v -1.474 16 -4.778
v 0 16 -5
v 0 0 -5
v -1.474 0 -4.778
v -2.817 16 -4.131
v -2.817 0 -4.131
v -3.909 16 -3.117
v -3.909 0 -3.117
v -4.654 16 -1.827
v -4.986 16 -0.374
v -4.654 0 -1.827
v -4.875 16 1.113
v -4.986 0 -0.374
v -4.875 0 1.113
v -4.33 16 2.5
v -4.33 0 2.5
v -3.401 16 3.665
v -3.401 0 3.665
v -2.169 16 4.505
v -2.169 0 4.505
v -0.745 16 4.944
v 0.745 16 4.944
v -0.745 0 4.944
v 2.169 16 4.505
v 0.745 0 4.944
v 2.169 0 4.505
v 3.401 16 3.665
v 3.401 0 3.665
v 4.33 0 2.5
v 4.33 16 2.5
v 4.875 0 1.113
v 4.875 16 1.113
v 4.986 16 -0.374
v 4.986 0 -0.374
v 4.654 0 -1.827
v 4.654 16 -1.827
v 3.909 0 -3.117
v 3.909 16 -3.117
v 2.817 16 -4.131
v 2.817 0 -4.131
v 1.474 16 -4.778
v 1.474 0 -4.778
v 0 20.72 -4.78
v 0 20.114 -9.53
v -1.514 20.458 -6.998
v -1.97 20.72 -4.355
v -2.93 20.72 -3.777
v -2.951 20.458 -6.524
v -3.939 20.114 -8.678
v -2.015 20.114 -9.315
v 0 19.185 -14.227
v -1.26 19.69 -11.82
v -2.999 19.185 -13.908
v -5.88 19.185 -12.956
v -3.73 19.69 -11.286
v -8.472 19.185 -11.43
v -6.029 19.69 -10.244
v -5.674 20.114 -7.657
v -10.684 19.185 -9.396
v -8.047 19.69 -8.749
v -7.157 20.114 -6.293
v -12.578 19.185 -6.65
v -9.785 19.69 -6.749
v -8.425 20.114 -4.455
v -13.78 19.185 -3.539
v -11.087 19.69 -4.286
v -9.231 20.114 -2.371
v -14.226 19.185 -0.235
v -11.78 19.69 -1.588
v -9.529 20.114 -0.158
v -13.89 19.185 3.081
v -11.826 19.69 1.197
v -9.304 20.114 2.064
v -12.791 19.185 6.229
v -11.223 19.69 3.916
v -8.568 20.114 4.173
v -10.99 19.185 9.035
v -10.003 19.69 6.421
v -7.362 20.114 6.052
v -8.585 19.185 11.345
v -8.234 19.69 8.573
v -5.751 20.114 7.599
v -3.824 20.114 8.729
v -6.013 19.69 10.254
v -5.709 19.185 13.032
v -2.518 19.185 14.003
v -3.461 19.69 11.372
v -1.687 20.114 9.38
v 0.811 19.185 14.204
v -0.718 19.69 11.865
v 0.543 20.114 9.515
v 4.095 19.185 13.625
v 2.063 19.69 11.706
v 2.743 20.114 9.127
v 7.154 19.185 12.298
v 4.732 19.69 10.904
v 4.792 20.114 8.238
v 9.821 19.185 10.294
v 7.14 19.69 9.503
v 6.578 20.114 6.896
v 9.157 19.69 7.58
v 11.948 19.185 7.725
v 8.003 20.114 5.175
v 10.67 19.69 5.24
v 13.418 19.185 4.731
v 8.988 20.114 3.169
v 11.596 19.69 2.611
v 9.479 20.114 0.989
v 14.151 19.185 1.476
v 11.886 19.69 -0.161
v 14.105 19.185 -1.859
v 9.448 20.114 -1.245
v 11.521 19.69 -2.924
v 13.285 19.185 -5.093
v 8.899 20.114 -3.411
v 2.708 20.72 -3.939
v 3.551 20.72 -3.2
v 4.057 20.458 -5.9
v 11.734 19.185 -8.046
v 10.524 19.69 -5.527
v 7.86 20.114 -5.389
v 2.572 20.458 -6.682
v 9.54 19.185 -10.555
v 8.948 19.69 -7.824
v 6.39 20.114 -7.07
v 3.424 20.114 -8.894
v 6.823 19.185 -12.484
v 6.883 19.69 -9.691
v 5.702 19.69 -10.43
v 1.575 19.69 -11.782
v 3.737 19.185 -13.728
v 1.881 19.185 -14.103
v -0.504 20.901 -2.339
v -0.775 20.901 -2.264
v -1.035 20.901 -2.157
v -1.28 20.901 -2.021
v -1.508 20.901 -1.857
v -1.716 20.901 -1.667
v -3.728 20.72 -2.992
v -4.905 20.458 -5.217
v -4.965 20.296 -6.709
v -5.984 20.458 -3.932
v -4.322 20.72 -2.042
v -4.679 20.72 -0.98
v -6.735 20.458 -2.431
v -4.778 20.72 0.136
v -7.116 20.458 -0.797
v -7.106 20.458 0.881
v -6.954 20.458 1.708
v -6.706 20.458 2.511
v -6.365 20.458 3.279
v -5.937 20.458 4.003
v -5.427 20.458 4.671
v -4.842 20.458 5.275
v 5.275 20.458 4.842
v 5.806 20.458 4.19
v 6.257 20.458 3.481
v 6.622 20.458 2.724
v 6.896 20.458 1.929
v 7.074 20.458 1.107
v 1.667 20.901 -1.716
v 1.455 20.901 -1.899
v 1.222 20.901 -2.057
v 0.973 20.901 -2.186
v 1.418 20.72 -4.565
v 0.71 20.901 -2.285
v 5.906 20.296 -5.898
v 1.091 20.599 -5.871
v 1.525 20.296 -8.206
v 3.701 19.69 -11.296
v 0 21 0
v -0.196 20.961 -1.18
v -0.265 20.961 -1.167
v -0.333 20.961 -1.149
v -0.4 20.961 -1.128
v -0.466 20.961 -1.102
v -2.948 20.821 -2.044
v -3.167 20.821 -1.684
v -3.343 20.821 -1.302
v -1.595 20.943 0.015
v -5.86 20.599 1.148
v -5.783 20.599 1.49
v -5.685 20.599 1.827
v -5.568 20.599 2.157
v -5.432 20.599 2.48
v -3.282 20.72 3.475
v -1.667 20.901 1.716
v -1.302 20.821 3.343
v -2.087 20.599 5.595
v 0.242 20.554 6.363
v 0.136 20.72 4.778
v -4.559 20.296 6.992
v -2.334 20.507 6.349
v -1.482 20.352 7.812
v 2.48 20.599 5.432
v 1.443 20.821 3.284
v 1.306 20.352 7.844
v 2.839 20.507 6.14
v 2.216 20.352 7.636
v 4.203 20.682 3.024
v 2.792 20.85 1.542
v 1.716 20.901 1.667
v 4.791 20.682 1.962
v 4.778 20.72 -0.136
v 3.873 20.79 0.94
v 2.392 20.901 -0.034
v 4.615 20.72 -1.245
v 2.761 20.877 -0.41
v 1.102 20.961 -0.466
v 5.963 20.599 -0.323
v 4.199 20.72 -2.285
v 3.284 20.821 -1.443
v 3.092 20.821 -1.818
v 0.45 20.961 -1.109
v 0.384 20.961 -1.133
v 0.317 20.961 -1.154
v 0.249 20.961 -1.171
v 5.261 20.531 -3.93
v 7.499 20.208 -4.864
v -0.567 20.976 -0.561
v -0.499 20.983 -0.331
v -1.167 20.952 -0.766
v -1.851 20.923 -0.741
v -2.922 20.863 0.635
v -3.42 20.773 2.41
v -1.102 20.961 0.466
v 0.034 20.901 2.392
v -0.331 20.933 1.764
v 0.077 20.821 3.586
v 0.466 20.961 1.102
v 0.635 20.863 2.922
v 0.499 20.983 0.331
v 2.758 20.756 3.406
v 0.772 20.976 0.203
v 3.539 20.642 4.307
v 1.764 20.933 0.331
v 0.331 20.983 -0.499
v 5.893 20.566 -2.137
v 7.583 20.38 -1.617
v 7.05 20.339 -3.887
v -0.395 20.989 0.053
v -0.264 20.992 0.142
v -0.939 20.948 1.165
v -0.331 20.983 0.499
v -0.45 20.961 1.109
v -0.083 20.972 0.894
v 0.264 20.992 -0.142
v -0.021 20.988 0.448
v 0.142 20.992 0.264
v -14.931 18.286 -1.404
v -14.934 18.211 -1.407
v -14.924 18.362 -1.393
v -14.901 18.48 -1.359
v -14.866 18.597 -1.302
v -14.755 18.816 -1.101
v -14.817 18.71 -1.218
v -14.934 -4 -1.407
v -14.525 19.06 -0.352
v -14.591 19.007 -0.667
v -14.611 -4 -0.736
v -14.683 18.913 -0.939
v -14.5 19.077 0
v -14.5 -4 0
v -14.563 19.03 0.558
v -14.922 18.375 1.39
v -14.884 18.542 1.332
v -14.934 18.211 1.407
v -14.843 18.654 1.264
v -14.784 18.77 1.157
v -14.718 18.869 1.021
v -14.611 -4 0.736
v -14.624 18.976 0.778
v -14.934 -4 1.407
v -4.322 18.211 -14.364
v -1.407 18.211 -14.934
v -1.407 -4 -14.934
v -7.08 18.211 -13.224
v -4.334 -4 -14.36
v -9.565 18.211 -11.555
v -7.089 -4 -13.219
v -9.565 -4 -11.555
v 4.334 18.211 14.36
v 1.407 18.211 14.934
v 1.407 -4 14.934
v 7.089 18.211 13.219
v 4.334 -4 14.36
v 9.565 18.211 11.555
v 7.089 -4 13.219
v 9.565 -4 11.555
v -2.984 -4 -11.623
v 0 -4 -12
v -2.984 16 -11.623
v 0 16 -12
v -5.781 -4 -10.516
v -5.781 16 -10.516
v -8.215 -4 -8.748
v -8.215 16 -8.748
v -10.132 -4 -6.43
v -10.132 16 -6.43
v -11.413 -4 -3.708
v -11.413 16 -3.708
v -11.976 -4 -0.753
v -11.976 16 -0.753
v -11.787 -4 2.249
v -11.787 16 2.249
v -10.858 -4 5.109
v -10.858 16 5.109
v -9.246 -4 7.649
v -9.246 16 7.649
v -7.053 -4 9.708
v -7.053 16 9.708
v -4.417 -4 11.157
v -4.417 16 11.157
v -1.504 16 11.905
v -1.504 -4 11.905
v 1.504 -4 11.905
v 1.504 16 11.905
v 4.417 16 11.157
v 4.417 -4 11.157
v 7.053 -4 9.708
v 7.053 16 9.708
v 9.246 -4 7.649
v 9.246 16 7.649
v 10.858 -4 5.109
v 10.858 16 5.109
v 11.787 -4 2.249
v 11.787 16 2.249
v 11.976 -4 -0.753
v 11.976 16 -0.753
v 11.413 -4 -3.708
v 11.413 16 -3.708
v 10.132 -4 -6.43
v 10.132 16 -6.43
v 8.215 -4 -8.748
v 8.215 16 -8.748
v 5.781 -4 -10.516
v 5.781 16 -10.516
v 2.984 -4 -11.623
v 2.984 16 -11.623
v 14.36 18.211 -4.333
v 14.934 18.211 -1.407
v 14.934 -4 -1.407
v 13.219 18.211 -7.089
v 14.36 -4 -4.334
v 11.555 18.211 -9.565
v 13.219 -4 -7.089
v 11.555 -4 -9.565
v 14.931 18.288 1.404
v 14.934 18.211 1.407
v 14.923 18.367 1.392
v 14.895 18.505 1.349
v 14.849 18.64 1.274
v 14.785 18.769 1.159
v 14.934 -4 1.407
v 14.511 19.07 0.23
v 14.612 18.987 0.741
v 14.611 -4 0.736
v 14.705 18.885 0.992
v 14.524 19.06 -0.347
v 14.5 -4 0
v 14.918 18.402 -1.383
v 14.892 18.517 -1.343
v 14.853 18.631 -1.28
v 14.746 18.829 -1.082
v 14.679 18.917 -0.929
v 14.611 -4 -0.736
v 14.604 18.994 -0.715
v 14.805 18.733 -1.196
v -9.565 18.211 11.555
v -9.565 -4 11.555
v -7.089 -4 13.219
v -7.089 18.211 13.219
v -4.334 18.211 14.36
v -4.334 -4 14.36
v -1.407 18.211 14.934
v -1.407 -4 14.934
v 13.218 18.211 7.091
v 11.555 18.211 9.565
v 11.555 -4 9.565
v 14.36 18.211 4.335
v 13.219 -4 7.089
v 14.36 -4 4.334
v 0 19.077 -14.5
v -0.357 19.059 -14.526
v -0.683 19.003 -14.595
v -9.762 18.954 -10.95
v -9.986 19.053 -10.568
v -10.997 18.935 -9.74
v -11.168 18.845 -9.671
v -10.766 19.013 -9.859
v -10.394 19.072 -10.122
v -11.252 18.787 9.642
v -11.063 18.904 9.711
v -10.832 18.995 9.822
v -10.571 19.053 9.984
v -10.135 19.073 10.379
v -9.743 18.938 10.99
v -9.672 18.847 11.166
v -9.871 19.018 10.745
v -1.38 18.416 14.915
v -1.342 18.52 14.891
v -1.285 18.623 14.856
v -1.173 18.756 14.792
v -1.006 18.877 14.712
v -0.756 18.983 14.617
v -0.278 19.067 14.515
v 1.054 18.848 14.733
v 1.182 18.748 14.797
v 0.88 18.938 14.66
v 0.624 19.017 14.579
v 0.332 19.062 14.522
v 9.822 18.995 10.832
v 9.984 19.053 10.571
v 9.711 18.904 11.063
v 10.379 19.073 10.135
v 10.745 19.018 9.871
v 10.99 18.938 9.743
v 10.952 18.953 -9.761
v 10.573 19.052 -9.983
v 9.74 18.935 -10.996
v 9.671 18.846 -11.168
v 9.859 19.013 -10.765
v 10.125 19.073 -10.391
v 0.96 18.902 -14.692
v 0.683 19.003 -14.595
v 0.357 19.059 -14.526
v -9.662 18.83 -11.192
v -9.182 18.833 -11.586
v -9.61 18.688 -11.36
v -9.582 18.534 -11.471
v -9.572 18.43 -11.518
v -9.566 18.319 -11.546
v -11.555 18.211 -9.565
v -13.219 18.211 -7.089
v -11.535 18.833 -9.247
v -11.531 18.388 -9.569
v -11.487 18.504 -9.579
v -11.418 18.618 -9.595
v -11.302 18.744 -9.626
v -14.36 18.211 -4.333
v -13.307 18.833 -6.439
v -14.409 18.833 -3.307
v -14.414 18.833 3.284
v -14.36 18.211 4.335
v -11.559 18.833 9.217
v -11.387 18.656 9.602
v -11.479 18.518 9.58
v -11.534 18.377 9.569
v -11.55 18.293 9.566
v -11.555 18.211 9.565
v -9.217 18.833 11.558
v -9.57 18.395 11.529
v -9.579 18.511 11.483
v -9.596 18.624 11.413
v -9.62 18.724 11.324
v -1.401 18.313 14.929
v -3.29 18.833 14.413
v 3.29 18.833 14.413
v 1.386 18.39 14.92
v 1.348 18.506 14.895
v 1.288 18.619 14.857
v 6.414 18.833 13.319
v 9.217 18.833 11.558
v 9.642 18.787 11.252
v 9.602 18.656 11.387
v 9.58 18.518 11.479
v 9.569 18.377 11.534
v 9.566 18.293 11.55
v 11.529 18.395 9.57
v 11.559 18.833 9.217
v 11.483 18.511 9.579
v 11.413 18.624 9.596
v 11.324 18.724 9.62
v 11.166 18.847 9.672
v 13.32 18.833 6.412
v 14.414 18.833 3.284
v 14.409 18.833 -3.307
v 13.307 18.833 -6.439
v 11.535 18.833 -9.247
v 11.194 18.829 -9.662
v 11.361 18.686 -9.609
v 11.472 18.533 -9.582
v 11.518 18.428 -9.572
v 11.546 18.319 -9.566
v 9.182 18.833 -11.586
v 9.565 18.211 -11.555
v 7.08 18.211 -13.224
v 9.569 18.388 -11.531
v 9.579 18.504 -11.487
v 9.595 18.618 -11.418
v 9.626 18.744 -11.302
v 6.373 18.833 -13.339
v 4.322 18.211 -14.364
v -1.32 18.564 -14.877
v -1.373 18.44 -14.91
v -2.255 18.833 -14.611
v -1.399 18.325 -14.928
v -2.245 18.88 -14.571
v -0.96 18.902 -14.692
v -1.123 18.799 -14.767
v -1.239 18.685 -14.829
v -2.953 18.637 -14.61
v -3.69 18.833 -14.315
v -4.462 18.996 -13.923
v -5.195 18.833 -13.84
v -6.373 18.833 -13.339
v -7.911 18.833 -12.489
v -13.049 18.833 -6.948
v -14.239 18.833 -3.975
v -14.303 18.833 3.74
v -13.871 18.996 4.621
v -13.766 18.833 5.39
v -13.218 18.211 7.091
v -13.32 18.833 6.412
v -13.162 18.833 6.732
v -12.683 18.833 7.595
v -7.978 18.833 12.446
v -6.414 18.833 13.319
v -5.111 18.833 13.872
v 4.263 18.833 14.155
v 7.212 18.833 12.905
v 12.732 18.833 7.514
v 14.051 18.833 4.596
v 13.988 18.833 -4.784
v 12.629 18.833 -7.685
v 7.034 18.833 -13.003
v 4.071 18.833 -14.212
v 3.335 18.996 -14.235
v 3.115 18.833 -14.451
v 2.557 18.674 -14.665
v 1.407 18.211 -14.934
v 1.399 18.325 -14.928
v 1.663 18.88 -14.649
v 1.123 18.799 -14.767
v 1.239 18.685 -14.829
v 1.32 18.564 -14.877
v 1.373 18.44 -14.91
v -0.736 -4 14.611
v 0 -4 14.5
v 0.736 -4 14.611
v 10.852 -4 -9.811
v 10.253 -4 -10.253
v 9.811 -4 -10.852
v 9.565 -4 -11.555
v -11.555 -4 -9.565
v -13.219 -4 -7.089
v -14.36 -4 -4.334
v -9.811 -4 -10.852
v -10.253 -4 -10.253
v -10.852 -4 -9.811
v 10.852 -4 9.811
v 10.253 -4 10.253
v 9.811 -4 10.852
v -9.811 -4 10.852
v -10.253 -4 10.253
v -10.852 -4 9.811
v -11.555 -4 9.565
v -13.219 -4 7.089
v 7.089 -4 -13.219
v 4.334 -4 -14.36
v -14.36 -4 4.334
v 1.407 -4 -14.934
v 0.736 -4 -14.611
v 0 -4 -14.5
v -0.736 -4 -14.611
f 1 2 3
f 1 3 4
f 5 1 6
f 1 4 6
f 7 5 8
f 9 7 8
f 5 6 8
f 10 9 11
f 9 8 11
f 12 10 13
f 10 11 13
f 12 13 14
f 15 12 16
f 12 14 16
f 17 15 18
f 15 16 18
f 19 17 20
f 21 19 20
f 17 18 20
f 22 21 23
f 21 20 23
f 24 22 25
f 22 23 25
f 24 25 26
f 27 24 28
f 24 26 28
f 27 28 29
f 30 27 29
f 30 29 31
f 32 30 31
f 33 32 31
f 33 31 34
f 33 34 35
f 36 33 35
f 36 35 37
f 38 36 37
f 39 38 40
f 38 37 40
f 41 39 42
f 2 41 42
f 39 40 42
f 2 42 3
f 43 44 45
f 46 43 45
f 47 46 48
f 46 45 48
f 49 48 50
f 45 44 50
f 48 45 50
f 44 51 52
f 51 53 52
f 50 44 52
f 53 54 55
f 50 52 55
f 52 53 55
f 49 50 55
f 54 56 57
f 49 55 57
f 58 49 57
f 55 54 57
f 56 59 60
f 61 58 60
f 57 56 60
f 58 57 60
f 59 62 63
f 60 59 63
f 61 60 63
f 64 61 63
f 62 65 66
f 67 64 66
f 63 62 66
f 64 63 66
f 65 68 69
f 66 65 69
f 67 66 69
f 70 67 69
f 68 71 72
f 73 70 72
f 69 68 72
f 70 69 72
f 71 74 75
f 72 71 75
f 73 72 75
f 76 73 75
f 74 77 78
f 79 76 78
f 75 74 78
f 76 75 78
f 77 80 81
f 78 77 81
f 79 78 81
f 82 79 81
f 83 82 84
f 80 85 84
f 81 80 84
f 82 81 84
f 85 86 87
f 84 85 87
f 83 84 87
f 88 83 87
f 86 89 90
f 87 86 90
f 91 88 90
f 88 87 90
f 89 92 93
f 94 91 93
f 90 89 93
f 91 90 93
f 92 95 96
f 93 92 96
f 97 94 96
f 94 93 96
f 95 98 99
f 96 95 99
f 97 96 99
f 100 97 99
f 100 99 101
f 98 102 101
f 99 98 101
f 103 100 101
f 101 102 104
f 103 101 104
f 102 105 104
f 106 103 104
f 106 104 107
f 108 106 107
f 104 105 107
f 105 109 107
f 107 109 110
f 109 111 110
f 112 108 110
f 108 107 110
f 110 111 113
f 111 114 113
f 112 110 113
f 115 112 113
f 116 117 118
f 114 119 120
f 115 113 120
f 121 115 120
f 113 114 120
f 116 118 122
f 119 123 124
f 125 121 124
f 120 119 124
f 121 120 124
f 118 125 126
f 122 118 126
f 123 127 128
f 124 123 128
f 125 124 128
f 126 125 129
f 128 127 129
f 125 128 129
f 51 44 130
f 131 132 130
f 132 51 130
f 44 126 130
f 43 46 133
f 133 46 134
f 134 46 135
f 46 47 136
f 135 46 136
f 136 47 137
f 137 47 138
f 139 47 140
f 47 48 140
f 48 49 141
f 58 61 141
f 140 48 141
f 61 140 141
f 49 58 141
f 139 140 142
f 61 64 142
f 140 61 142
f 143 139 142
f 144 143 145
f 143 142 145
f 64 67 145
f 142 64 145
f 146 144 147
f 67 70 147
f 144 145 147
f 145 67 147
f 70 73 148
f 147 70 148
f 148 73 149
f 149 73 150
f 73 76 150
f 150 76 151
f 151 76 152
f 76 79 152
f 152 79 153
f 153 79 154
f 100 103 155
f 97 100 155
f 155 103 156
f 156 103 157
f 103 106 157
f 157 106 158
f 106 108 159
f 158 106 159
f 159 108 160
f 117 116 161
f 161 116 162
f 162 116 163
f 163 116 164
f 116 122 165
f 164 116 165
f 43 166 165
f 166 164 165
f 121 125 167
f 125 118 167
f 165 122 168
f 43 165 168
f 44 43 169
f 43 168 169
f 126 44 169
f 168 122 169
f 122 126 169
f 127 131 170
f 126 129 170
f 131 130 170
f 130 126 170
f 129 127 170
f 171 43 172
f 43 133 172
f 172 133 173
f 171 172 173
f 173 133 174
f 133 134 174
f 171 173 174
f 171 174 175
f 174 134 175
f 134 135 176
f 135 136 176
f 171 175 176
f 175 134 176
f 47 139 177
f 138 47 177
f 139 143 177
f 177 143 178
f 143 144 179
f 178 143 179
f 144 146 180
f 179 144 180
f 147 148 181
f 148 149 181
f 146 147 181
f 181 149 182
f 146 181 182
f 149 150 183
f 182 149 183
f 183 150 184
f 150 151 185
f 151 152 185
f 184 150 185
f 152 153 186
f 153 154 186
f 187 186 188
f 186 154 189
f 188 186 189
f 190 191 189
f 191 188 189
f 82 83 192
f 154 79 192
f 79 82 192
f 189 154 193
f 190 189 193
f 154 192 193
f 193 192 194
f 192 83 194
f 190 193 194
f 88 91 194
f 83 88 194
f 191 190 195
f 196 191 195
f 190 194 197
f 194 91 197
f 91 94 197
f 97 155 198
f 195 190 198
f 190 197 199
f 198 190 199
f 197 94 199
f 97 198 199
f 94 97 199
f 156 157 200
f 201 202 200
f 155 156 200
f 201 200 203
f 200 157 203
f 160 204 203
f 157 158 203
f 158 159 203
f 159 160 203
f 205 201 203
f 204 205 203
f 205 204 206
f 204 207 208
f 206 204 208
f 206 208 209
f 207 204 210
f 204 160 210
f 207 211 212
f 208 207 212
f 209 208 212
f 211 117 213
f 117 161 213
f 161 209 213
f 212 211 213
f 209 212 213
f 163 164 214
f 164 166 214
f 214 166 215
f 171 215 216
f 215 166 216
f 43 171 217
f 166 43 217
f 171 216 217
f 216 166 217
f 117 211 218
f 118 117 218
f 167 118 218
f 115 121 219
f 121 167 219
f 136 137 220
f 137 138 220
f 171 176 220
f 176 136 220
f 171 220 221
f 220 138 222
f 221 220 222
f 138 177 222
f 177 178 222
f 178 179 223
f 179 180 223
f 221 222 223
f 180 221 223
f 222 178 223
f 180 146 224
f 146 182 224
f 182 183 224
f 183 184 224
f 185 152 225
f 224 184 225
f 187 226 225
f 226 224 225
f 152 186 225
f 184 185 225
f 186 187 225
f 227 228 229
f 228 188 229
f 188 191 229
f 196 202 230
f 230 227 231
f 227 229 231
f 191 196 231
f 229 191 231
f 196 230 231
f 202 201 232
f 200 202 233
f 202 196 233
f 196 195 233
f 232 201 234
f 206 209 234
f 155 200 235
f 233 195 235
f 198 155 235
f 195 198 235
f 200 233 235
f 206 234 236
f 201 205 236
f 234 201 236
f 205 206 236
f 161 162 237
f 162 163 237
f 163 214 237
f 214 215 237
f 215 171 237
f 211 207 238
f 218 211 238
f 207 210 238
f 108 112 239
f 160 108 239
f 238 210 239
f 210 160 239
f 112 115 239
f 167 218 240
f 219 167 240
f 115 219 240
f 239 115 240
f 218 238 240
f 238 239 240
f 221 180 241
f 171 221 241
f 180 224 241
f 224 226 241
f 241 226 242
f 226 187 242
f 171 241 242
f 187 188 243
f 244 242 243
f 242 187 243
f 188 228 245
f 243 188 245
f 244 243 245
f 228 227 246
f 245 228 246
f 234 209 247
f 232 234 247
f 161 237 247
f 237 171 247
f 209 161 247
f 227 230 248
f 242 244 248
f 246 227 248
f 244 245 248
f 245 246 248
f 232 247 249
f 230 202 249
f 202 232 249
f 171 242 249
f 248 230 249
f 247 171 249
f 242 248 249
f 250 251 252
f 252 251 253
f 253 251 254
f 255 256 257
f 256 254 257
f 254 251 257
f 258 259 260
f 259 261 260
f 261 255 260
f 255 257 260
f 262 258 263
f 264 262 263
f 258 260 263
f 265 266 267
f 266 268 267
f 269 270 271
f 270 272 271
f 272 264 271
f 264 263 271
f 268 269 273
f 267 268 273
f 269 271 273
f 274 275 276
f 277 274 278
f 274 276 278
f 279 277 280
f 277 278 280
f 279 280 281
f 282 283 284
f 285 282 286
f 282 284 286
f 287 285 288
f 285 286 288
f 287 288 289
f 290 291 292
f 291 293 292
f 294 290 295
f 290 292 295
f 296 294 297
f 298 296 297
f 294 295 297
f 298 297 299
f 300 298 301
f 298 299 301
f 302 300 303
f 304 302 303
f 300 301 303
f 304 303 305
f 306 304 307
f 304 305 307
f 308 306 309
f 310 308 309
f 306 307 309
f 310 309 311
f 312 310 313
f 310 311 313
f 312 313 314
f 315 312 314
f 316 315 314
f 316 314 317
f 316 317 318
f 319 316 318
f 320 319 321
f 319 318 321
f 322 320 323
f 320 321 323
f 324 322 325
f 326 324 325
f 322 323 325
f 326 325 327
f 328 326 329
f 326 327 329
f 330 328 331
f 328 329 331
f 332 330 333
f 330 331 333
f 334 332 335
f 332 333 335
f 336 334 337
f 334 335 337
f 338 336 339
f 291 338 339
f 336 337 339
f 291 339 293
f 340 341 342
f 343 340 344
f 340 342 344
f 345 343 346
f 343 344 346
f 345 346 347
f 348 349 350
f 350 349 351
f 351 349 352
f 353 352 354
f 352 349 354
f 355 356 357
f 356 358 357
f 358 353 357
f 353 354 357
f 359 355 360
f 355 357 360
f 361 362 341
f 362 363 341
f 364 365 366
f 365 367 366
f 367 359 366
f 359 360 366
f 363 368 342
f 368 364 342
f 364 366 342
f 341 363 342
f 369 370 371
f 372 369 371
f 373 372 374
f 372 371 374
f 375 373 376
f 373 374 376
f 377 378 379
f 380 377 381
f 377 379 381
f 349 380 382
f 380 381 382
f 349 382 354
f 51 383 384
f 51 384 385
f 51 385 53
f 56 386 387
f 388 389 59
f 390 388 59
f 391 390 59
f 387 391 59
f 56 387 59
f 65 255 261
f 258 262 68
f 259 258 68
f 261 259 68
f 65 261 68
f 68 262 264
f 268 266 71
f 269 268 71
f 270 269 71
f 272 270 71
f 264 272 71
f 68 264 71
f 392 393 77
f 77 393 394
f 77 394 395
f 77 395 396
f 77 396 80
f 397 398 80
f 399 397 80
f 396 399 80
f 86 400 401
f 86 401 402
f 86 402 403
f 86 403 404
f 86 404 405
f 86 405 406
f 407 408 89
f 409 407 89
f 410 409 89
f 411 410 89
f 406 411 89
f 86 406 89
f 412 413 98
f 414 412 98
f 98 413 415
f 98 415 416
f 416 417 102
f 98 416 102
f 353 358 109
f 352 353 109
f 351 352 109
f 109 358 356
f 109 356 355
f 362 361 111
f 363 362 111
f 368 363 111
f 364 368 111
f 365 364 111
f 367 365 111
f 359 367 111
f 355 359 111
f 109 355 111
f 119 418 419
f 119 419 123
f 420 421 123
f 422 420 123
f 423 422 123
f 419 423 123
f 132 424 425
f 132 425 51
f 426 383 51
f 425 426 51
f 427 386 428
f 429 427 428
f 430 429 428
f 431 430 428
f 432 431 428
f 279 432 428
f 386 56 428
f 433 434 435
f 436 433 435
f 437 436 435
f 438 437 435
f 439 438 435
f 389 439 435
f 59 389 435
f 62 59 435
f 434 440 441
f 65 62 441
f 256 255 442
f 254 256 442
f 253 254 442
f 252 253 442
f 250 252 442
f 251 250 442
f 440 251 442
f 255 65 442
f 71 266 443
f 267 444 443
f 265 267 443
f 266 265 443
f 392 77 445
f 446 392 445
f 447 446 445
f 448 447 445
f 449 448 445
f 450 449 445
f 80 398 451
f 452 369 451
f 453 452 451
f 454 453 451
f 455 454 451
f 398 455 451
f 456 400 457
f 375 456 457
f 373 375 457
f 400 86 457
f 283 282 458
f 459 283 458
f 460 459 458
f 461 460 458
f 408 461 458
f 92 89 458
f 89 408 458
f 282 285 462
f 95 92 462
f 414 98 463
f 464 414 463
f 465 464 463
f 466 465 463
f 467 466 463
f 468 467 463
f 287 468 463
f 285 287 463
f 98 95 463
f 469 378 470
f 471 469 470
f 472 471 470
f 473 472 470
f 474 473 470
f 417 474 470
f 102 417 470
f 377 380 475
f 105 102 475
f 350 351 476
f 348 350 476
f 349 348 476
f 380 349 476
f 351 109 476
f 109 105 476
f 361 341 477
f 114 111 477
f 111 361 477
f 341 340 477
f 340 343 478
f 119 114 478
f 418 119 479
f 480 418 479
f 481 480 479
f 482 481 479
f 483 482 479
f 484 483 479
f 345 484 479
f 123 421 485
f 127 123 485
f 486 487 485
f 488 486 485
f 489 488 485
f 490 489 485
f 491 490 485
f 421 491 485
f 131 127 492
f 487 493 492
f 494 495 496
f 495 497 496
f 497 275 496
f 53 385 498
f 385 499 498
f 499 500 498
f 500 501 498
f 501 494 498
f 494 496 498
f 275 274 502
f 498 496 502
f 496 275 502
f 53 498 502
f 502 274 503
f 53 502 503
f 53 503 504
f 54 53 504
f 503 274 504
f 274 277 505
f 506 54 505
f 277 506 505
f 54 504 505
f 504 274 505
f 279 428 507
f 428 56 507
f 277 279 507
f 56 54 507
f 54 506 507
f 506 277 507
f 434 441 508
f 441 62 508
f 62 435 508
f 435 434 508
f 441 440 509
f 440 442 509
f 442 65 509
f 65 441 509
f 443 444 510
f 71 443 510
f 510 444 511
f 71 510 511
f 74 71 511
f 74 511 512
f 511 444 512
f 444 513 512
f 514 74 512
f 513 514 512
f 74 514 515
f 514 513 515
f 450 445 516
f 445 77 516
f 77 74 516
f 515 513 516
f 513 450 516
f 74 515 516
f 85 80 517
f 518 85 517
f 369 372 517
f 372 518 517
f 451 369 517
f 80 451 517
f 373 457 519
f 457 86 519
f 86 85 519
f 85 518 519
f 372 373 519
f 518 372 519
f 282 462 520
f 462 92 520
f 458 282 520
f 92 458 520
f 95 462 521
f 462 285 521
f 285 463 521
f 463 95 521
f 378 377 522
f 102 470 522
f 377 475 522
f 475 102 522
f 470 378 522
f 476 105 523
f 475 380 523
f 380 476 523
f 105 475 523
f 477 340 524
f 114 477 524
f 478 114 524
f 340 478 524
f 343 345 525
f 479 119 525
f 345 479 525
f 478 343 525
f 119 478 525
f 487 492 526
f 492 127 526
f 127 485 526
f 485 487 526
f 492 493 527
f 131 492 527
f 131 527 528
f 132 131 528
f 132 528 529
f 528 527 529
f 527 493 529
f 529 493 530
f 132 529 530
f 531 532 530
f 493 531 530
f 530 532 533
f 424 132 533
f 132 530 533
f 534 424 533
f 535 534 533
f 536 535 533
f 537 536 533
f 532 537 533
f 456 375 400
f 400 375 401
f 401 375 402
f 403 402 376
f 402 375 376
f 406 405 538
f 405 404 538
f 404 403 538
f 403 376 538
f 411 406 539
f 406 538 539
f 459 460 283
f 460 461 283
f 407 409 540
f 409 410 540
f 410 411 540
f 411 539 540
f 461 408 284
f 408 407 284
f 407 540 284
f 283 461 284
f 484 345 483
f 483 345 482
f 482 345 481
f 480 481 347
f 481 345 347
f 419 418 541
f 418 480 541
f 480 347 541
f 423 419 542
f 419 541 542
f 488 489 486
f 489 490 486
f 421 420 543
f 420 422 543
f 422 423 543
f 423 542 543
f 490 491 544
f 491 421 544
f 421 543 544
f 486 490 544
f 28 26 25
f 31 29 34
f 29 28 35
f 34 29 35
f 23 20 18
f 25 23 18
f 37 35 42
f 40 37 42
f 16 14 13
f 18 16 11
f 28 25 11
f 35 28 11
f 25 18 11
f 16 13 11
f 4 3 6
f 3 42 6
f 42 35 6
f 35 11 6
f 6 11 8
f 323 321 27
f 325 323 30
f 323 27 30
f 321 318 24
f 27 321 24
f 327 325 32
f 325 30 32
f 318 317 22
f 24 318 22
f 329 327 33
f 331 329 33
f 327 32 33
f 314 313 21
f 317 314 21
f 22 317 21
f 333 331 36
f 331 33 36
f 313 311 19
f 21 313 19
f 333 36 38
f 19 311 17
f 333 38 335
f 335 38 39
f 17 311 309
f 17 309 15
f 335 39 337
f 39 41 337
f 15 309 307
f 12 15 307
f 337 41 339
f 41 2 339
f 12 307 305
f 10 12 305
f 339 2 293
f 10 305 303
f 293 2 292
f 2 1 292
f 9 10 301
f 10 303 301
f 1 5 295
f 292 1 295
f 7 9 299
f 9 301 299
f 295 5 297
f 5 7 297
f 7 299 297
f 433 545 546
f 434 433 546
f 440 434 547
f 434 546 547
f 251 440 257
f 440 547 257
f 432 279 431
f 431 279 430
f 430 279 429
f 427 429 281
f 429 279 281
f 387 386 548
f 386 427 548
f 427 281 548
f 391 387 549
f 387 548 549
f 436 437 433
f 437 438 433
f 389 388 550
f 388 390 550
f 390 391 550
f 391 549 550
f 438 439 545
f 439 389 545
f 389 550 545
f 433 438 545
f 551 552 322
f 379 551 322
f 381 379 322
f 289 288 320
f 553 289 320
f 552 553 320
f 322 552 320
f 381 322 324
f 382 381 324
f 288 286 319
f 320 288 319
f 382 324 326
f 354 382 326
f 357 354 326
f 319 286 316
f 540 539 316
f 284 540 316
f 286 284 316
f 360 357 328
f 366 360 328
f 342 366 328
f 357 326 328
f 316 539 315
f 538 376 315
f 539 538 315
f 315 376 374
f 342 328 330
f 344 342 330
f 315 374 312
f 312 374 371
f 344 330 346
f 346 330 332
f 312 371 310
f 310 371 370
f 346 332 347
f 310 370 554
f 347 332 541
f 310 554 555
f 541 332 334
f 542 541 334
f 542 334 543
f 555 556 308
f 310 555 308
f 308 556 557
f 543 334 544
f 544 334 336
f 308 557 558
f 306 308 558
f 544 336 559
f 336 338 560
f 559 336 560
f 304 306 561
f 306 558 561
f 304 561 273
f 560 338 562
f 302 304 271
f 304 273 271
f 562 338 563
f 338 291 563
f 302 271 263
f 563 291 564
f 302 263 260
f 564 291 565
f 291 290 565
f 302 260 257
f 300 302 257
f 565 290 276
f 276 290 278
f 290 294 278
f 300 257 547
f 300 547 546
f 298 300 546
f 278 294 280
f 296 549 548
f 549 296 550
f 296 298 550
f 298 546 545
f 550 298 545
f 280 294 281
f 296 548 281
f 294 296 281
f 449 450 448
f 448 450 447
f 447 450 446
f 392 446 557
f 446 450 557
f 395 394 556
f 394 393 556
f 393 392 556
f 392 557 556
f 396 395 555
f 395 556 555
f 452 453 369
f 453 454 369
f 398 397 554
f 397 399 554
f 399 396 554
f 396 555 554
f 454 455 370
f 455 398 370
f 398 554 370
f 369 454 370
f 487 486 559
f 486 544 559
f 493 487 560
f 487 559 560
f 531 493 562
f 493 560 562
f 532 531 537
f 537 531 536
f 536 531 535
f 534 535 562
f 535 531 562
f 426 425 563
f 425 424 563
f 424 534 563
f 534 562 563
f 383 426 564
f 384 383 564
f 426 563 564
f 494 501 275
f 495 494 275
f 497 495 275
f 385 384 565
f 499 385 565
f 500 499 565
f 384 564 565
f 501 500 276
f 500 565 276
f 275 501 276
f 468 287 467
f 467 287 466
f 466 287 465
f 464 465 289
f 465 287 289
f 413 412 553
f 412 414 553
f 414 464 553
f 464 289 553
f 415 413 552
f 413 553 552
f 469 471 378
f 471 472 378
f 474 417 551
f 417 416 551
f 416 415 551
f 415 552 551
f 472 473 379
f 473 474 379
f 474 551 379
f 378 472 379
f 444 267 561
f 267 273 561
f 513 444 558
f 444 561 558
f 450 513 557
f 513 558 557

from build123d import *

# Parameters (mm, degrees)
FILLET1_R          = 1
SKETCH2_R          = 2.5
CUT_EXTRUDE1_DEPTH = 33.787192789


with BuildPart() as part:
    # Sketch1 → Revolve1 (revolve)
    with BuildSketch(Plane.XY, mode=Mode.PRIVATE) as revolve1_sk:
        with BuildLine():
            Line((-15, 19), (-15, -4))
            Line((-15, -4), (-12, -4))
            Line((-12, -4), (-12, 16))
            Line((-12, 16), (-5, 16))
            Line((-5, 16), (-5, 0))
            Line((-5, 0), (0, 0))
            Line((0, 0), (0, 21))
            ThreePointArc((0, 21), (-7.554204313, 20.406532346), (-15, 19))
        make_face()
    revolve(revolve1_sk.sketch.rotate(Axis((0, 0, 0), (0, 1, 0)), 270), axis=Axis((0, 0, 0), (0, 1, 0)))

    # Fillet1
    fillet1_edges = [part.edges().sort_by_distance(p)[0] for p in [
        (0, 19, 15),
    ]]
    fillet(fillet1_edges, radius=FILLET1_R)

    # Sketch2 → Cut-Extrude1 (cut, through all)
    with BuildSketch(Plane.XZ.offset(4)):
        with Locations((-17, 0)):
            Circle(SKETCH2_R)
        with Locations((-12.02081528, 12.02081528)):
            Circle(SKETCH2_R)
        with Locations((0, 17)):
            Circle(SKETCH2_R)
        with Locations((12.02081528, 12.02081528)):
            Circle(SKETCH2_R)
        with Locations((17, 0)):
            Circle(SKETCH2_R)
        with Locations((12.02081528, -12.02081528)):
            Circle(SKETCH2_R)
        with Locations((0, -17)):
            Circle(SKETCH2_R)
        with Locations((-12.02081528, -12.02081528)):
            Circle(SKETCH2_R)
    extrude(amount=-CUT_EXTRUDE1_DEPTH, mode=Mode.SUBTRACT)


solid = part.part
